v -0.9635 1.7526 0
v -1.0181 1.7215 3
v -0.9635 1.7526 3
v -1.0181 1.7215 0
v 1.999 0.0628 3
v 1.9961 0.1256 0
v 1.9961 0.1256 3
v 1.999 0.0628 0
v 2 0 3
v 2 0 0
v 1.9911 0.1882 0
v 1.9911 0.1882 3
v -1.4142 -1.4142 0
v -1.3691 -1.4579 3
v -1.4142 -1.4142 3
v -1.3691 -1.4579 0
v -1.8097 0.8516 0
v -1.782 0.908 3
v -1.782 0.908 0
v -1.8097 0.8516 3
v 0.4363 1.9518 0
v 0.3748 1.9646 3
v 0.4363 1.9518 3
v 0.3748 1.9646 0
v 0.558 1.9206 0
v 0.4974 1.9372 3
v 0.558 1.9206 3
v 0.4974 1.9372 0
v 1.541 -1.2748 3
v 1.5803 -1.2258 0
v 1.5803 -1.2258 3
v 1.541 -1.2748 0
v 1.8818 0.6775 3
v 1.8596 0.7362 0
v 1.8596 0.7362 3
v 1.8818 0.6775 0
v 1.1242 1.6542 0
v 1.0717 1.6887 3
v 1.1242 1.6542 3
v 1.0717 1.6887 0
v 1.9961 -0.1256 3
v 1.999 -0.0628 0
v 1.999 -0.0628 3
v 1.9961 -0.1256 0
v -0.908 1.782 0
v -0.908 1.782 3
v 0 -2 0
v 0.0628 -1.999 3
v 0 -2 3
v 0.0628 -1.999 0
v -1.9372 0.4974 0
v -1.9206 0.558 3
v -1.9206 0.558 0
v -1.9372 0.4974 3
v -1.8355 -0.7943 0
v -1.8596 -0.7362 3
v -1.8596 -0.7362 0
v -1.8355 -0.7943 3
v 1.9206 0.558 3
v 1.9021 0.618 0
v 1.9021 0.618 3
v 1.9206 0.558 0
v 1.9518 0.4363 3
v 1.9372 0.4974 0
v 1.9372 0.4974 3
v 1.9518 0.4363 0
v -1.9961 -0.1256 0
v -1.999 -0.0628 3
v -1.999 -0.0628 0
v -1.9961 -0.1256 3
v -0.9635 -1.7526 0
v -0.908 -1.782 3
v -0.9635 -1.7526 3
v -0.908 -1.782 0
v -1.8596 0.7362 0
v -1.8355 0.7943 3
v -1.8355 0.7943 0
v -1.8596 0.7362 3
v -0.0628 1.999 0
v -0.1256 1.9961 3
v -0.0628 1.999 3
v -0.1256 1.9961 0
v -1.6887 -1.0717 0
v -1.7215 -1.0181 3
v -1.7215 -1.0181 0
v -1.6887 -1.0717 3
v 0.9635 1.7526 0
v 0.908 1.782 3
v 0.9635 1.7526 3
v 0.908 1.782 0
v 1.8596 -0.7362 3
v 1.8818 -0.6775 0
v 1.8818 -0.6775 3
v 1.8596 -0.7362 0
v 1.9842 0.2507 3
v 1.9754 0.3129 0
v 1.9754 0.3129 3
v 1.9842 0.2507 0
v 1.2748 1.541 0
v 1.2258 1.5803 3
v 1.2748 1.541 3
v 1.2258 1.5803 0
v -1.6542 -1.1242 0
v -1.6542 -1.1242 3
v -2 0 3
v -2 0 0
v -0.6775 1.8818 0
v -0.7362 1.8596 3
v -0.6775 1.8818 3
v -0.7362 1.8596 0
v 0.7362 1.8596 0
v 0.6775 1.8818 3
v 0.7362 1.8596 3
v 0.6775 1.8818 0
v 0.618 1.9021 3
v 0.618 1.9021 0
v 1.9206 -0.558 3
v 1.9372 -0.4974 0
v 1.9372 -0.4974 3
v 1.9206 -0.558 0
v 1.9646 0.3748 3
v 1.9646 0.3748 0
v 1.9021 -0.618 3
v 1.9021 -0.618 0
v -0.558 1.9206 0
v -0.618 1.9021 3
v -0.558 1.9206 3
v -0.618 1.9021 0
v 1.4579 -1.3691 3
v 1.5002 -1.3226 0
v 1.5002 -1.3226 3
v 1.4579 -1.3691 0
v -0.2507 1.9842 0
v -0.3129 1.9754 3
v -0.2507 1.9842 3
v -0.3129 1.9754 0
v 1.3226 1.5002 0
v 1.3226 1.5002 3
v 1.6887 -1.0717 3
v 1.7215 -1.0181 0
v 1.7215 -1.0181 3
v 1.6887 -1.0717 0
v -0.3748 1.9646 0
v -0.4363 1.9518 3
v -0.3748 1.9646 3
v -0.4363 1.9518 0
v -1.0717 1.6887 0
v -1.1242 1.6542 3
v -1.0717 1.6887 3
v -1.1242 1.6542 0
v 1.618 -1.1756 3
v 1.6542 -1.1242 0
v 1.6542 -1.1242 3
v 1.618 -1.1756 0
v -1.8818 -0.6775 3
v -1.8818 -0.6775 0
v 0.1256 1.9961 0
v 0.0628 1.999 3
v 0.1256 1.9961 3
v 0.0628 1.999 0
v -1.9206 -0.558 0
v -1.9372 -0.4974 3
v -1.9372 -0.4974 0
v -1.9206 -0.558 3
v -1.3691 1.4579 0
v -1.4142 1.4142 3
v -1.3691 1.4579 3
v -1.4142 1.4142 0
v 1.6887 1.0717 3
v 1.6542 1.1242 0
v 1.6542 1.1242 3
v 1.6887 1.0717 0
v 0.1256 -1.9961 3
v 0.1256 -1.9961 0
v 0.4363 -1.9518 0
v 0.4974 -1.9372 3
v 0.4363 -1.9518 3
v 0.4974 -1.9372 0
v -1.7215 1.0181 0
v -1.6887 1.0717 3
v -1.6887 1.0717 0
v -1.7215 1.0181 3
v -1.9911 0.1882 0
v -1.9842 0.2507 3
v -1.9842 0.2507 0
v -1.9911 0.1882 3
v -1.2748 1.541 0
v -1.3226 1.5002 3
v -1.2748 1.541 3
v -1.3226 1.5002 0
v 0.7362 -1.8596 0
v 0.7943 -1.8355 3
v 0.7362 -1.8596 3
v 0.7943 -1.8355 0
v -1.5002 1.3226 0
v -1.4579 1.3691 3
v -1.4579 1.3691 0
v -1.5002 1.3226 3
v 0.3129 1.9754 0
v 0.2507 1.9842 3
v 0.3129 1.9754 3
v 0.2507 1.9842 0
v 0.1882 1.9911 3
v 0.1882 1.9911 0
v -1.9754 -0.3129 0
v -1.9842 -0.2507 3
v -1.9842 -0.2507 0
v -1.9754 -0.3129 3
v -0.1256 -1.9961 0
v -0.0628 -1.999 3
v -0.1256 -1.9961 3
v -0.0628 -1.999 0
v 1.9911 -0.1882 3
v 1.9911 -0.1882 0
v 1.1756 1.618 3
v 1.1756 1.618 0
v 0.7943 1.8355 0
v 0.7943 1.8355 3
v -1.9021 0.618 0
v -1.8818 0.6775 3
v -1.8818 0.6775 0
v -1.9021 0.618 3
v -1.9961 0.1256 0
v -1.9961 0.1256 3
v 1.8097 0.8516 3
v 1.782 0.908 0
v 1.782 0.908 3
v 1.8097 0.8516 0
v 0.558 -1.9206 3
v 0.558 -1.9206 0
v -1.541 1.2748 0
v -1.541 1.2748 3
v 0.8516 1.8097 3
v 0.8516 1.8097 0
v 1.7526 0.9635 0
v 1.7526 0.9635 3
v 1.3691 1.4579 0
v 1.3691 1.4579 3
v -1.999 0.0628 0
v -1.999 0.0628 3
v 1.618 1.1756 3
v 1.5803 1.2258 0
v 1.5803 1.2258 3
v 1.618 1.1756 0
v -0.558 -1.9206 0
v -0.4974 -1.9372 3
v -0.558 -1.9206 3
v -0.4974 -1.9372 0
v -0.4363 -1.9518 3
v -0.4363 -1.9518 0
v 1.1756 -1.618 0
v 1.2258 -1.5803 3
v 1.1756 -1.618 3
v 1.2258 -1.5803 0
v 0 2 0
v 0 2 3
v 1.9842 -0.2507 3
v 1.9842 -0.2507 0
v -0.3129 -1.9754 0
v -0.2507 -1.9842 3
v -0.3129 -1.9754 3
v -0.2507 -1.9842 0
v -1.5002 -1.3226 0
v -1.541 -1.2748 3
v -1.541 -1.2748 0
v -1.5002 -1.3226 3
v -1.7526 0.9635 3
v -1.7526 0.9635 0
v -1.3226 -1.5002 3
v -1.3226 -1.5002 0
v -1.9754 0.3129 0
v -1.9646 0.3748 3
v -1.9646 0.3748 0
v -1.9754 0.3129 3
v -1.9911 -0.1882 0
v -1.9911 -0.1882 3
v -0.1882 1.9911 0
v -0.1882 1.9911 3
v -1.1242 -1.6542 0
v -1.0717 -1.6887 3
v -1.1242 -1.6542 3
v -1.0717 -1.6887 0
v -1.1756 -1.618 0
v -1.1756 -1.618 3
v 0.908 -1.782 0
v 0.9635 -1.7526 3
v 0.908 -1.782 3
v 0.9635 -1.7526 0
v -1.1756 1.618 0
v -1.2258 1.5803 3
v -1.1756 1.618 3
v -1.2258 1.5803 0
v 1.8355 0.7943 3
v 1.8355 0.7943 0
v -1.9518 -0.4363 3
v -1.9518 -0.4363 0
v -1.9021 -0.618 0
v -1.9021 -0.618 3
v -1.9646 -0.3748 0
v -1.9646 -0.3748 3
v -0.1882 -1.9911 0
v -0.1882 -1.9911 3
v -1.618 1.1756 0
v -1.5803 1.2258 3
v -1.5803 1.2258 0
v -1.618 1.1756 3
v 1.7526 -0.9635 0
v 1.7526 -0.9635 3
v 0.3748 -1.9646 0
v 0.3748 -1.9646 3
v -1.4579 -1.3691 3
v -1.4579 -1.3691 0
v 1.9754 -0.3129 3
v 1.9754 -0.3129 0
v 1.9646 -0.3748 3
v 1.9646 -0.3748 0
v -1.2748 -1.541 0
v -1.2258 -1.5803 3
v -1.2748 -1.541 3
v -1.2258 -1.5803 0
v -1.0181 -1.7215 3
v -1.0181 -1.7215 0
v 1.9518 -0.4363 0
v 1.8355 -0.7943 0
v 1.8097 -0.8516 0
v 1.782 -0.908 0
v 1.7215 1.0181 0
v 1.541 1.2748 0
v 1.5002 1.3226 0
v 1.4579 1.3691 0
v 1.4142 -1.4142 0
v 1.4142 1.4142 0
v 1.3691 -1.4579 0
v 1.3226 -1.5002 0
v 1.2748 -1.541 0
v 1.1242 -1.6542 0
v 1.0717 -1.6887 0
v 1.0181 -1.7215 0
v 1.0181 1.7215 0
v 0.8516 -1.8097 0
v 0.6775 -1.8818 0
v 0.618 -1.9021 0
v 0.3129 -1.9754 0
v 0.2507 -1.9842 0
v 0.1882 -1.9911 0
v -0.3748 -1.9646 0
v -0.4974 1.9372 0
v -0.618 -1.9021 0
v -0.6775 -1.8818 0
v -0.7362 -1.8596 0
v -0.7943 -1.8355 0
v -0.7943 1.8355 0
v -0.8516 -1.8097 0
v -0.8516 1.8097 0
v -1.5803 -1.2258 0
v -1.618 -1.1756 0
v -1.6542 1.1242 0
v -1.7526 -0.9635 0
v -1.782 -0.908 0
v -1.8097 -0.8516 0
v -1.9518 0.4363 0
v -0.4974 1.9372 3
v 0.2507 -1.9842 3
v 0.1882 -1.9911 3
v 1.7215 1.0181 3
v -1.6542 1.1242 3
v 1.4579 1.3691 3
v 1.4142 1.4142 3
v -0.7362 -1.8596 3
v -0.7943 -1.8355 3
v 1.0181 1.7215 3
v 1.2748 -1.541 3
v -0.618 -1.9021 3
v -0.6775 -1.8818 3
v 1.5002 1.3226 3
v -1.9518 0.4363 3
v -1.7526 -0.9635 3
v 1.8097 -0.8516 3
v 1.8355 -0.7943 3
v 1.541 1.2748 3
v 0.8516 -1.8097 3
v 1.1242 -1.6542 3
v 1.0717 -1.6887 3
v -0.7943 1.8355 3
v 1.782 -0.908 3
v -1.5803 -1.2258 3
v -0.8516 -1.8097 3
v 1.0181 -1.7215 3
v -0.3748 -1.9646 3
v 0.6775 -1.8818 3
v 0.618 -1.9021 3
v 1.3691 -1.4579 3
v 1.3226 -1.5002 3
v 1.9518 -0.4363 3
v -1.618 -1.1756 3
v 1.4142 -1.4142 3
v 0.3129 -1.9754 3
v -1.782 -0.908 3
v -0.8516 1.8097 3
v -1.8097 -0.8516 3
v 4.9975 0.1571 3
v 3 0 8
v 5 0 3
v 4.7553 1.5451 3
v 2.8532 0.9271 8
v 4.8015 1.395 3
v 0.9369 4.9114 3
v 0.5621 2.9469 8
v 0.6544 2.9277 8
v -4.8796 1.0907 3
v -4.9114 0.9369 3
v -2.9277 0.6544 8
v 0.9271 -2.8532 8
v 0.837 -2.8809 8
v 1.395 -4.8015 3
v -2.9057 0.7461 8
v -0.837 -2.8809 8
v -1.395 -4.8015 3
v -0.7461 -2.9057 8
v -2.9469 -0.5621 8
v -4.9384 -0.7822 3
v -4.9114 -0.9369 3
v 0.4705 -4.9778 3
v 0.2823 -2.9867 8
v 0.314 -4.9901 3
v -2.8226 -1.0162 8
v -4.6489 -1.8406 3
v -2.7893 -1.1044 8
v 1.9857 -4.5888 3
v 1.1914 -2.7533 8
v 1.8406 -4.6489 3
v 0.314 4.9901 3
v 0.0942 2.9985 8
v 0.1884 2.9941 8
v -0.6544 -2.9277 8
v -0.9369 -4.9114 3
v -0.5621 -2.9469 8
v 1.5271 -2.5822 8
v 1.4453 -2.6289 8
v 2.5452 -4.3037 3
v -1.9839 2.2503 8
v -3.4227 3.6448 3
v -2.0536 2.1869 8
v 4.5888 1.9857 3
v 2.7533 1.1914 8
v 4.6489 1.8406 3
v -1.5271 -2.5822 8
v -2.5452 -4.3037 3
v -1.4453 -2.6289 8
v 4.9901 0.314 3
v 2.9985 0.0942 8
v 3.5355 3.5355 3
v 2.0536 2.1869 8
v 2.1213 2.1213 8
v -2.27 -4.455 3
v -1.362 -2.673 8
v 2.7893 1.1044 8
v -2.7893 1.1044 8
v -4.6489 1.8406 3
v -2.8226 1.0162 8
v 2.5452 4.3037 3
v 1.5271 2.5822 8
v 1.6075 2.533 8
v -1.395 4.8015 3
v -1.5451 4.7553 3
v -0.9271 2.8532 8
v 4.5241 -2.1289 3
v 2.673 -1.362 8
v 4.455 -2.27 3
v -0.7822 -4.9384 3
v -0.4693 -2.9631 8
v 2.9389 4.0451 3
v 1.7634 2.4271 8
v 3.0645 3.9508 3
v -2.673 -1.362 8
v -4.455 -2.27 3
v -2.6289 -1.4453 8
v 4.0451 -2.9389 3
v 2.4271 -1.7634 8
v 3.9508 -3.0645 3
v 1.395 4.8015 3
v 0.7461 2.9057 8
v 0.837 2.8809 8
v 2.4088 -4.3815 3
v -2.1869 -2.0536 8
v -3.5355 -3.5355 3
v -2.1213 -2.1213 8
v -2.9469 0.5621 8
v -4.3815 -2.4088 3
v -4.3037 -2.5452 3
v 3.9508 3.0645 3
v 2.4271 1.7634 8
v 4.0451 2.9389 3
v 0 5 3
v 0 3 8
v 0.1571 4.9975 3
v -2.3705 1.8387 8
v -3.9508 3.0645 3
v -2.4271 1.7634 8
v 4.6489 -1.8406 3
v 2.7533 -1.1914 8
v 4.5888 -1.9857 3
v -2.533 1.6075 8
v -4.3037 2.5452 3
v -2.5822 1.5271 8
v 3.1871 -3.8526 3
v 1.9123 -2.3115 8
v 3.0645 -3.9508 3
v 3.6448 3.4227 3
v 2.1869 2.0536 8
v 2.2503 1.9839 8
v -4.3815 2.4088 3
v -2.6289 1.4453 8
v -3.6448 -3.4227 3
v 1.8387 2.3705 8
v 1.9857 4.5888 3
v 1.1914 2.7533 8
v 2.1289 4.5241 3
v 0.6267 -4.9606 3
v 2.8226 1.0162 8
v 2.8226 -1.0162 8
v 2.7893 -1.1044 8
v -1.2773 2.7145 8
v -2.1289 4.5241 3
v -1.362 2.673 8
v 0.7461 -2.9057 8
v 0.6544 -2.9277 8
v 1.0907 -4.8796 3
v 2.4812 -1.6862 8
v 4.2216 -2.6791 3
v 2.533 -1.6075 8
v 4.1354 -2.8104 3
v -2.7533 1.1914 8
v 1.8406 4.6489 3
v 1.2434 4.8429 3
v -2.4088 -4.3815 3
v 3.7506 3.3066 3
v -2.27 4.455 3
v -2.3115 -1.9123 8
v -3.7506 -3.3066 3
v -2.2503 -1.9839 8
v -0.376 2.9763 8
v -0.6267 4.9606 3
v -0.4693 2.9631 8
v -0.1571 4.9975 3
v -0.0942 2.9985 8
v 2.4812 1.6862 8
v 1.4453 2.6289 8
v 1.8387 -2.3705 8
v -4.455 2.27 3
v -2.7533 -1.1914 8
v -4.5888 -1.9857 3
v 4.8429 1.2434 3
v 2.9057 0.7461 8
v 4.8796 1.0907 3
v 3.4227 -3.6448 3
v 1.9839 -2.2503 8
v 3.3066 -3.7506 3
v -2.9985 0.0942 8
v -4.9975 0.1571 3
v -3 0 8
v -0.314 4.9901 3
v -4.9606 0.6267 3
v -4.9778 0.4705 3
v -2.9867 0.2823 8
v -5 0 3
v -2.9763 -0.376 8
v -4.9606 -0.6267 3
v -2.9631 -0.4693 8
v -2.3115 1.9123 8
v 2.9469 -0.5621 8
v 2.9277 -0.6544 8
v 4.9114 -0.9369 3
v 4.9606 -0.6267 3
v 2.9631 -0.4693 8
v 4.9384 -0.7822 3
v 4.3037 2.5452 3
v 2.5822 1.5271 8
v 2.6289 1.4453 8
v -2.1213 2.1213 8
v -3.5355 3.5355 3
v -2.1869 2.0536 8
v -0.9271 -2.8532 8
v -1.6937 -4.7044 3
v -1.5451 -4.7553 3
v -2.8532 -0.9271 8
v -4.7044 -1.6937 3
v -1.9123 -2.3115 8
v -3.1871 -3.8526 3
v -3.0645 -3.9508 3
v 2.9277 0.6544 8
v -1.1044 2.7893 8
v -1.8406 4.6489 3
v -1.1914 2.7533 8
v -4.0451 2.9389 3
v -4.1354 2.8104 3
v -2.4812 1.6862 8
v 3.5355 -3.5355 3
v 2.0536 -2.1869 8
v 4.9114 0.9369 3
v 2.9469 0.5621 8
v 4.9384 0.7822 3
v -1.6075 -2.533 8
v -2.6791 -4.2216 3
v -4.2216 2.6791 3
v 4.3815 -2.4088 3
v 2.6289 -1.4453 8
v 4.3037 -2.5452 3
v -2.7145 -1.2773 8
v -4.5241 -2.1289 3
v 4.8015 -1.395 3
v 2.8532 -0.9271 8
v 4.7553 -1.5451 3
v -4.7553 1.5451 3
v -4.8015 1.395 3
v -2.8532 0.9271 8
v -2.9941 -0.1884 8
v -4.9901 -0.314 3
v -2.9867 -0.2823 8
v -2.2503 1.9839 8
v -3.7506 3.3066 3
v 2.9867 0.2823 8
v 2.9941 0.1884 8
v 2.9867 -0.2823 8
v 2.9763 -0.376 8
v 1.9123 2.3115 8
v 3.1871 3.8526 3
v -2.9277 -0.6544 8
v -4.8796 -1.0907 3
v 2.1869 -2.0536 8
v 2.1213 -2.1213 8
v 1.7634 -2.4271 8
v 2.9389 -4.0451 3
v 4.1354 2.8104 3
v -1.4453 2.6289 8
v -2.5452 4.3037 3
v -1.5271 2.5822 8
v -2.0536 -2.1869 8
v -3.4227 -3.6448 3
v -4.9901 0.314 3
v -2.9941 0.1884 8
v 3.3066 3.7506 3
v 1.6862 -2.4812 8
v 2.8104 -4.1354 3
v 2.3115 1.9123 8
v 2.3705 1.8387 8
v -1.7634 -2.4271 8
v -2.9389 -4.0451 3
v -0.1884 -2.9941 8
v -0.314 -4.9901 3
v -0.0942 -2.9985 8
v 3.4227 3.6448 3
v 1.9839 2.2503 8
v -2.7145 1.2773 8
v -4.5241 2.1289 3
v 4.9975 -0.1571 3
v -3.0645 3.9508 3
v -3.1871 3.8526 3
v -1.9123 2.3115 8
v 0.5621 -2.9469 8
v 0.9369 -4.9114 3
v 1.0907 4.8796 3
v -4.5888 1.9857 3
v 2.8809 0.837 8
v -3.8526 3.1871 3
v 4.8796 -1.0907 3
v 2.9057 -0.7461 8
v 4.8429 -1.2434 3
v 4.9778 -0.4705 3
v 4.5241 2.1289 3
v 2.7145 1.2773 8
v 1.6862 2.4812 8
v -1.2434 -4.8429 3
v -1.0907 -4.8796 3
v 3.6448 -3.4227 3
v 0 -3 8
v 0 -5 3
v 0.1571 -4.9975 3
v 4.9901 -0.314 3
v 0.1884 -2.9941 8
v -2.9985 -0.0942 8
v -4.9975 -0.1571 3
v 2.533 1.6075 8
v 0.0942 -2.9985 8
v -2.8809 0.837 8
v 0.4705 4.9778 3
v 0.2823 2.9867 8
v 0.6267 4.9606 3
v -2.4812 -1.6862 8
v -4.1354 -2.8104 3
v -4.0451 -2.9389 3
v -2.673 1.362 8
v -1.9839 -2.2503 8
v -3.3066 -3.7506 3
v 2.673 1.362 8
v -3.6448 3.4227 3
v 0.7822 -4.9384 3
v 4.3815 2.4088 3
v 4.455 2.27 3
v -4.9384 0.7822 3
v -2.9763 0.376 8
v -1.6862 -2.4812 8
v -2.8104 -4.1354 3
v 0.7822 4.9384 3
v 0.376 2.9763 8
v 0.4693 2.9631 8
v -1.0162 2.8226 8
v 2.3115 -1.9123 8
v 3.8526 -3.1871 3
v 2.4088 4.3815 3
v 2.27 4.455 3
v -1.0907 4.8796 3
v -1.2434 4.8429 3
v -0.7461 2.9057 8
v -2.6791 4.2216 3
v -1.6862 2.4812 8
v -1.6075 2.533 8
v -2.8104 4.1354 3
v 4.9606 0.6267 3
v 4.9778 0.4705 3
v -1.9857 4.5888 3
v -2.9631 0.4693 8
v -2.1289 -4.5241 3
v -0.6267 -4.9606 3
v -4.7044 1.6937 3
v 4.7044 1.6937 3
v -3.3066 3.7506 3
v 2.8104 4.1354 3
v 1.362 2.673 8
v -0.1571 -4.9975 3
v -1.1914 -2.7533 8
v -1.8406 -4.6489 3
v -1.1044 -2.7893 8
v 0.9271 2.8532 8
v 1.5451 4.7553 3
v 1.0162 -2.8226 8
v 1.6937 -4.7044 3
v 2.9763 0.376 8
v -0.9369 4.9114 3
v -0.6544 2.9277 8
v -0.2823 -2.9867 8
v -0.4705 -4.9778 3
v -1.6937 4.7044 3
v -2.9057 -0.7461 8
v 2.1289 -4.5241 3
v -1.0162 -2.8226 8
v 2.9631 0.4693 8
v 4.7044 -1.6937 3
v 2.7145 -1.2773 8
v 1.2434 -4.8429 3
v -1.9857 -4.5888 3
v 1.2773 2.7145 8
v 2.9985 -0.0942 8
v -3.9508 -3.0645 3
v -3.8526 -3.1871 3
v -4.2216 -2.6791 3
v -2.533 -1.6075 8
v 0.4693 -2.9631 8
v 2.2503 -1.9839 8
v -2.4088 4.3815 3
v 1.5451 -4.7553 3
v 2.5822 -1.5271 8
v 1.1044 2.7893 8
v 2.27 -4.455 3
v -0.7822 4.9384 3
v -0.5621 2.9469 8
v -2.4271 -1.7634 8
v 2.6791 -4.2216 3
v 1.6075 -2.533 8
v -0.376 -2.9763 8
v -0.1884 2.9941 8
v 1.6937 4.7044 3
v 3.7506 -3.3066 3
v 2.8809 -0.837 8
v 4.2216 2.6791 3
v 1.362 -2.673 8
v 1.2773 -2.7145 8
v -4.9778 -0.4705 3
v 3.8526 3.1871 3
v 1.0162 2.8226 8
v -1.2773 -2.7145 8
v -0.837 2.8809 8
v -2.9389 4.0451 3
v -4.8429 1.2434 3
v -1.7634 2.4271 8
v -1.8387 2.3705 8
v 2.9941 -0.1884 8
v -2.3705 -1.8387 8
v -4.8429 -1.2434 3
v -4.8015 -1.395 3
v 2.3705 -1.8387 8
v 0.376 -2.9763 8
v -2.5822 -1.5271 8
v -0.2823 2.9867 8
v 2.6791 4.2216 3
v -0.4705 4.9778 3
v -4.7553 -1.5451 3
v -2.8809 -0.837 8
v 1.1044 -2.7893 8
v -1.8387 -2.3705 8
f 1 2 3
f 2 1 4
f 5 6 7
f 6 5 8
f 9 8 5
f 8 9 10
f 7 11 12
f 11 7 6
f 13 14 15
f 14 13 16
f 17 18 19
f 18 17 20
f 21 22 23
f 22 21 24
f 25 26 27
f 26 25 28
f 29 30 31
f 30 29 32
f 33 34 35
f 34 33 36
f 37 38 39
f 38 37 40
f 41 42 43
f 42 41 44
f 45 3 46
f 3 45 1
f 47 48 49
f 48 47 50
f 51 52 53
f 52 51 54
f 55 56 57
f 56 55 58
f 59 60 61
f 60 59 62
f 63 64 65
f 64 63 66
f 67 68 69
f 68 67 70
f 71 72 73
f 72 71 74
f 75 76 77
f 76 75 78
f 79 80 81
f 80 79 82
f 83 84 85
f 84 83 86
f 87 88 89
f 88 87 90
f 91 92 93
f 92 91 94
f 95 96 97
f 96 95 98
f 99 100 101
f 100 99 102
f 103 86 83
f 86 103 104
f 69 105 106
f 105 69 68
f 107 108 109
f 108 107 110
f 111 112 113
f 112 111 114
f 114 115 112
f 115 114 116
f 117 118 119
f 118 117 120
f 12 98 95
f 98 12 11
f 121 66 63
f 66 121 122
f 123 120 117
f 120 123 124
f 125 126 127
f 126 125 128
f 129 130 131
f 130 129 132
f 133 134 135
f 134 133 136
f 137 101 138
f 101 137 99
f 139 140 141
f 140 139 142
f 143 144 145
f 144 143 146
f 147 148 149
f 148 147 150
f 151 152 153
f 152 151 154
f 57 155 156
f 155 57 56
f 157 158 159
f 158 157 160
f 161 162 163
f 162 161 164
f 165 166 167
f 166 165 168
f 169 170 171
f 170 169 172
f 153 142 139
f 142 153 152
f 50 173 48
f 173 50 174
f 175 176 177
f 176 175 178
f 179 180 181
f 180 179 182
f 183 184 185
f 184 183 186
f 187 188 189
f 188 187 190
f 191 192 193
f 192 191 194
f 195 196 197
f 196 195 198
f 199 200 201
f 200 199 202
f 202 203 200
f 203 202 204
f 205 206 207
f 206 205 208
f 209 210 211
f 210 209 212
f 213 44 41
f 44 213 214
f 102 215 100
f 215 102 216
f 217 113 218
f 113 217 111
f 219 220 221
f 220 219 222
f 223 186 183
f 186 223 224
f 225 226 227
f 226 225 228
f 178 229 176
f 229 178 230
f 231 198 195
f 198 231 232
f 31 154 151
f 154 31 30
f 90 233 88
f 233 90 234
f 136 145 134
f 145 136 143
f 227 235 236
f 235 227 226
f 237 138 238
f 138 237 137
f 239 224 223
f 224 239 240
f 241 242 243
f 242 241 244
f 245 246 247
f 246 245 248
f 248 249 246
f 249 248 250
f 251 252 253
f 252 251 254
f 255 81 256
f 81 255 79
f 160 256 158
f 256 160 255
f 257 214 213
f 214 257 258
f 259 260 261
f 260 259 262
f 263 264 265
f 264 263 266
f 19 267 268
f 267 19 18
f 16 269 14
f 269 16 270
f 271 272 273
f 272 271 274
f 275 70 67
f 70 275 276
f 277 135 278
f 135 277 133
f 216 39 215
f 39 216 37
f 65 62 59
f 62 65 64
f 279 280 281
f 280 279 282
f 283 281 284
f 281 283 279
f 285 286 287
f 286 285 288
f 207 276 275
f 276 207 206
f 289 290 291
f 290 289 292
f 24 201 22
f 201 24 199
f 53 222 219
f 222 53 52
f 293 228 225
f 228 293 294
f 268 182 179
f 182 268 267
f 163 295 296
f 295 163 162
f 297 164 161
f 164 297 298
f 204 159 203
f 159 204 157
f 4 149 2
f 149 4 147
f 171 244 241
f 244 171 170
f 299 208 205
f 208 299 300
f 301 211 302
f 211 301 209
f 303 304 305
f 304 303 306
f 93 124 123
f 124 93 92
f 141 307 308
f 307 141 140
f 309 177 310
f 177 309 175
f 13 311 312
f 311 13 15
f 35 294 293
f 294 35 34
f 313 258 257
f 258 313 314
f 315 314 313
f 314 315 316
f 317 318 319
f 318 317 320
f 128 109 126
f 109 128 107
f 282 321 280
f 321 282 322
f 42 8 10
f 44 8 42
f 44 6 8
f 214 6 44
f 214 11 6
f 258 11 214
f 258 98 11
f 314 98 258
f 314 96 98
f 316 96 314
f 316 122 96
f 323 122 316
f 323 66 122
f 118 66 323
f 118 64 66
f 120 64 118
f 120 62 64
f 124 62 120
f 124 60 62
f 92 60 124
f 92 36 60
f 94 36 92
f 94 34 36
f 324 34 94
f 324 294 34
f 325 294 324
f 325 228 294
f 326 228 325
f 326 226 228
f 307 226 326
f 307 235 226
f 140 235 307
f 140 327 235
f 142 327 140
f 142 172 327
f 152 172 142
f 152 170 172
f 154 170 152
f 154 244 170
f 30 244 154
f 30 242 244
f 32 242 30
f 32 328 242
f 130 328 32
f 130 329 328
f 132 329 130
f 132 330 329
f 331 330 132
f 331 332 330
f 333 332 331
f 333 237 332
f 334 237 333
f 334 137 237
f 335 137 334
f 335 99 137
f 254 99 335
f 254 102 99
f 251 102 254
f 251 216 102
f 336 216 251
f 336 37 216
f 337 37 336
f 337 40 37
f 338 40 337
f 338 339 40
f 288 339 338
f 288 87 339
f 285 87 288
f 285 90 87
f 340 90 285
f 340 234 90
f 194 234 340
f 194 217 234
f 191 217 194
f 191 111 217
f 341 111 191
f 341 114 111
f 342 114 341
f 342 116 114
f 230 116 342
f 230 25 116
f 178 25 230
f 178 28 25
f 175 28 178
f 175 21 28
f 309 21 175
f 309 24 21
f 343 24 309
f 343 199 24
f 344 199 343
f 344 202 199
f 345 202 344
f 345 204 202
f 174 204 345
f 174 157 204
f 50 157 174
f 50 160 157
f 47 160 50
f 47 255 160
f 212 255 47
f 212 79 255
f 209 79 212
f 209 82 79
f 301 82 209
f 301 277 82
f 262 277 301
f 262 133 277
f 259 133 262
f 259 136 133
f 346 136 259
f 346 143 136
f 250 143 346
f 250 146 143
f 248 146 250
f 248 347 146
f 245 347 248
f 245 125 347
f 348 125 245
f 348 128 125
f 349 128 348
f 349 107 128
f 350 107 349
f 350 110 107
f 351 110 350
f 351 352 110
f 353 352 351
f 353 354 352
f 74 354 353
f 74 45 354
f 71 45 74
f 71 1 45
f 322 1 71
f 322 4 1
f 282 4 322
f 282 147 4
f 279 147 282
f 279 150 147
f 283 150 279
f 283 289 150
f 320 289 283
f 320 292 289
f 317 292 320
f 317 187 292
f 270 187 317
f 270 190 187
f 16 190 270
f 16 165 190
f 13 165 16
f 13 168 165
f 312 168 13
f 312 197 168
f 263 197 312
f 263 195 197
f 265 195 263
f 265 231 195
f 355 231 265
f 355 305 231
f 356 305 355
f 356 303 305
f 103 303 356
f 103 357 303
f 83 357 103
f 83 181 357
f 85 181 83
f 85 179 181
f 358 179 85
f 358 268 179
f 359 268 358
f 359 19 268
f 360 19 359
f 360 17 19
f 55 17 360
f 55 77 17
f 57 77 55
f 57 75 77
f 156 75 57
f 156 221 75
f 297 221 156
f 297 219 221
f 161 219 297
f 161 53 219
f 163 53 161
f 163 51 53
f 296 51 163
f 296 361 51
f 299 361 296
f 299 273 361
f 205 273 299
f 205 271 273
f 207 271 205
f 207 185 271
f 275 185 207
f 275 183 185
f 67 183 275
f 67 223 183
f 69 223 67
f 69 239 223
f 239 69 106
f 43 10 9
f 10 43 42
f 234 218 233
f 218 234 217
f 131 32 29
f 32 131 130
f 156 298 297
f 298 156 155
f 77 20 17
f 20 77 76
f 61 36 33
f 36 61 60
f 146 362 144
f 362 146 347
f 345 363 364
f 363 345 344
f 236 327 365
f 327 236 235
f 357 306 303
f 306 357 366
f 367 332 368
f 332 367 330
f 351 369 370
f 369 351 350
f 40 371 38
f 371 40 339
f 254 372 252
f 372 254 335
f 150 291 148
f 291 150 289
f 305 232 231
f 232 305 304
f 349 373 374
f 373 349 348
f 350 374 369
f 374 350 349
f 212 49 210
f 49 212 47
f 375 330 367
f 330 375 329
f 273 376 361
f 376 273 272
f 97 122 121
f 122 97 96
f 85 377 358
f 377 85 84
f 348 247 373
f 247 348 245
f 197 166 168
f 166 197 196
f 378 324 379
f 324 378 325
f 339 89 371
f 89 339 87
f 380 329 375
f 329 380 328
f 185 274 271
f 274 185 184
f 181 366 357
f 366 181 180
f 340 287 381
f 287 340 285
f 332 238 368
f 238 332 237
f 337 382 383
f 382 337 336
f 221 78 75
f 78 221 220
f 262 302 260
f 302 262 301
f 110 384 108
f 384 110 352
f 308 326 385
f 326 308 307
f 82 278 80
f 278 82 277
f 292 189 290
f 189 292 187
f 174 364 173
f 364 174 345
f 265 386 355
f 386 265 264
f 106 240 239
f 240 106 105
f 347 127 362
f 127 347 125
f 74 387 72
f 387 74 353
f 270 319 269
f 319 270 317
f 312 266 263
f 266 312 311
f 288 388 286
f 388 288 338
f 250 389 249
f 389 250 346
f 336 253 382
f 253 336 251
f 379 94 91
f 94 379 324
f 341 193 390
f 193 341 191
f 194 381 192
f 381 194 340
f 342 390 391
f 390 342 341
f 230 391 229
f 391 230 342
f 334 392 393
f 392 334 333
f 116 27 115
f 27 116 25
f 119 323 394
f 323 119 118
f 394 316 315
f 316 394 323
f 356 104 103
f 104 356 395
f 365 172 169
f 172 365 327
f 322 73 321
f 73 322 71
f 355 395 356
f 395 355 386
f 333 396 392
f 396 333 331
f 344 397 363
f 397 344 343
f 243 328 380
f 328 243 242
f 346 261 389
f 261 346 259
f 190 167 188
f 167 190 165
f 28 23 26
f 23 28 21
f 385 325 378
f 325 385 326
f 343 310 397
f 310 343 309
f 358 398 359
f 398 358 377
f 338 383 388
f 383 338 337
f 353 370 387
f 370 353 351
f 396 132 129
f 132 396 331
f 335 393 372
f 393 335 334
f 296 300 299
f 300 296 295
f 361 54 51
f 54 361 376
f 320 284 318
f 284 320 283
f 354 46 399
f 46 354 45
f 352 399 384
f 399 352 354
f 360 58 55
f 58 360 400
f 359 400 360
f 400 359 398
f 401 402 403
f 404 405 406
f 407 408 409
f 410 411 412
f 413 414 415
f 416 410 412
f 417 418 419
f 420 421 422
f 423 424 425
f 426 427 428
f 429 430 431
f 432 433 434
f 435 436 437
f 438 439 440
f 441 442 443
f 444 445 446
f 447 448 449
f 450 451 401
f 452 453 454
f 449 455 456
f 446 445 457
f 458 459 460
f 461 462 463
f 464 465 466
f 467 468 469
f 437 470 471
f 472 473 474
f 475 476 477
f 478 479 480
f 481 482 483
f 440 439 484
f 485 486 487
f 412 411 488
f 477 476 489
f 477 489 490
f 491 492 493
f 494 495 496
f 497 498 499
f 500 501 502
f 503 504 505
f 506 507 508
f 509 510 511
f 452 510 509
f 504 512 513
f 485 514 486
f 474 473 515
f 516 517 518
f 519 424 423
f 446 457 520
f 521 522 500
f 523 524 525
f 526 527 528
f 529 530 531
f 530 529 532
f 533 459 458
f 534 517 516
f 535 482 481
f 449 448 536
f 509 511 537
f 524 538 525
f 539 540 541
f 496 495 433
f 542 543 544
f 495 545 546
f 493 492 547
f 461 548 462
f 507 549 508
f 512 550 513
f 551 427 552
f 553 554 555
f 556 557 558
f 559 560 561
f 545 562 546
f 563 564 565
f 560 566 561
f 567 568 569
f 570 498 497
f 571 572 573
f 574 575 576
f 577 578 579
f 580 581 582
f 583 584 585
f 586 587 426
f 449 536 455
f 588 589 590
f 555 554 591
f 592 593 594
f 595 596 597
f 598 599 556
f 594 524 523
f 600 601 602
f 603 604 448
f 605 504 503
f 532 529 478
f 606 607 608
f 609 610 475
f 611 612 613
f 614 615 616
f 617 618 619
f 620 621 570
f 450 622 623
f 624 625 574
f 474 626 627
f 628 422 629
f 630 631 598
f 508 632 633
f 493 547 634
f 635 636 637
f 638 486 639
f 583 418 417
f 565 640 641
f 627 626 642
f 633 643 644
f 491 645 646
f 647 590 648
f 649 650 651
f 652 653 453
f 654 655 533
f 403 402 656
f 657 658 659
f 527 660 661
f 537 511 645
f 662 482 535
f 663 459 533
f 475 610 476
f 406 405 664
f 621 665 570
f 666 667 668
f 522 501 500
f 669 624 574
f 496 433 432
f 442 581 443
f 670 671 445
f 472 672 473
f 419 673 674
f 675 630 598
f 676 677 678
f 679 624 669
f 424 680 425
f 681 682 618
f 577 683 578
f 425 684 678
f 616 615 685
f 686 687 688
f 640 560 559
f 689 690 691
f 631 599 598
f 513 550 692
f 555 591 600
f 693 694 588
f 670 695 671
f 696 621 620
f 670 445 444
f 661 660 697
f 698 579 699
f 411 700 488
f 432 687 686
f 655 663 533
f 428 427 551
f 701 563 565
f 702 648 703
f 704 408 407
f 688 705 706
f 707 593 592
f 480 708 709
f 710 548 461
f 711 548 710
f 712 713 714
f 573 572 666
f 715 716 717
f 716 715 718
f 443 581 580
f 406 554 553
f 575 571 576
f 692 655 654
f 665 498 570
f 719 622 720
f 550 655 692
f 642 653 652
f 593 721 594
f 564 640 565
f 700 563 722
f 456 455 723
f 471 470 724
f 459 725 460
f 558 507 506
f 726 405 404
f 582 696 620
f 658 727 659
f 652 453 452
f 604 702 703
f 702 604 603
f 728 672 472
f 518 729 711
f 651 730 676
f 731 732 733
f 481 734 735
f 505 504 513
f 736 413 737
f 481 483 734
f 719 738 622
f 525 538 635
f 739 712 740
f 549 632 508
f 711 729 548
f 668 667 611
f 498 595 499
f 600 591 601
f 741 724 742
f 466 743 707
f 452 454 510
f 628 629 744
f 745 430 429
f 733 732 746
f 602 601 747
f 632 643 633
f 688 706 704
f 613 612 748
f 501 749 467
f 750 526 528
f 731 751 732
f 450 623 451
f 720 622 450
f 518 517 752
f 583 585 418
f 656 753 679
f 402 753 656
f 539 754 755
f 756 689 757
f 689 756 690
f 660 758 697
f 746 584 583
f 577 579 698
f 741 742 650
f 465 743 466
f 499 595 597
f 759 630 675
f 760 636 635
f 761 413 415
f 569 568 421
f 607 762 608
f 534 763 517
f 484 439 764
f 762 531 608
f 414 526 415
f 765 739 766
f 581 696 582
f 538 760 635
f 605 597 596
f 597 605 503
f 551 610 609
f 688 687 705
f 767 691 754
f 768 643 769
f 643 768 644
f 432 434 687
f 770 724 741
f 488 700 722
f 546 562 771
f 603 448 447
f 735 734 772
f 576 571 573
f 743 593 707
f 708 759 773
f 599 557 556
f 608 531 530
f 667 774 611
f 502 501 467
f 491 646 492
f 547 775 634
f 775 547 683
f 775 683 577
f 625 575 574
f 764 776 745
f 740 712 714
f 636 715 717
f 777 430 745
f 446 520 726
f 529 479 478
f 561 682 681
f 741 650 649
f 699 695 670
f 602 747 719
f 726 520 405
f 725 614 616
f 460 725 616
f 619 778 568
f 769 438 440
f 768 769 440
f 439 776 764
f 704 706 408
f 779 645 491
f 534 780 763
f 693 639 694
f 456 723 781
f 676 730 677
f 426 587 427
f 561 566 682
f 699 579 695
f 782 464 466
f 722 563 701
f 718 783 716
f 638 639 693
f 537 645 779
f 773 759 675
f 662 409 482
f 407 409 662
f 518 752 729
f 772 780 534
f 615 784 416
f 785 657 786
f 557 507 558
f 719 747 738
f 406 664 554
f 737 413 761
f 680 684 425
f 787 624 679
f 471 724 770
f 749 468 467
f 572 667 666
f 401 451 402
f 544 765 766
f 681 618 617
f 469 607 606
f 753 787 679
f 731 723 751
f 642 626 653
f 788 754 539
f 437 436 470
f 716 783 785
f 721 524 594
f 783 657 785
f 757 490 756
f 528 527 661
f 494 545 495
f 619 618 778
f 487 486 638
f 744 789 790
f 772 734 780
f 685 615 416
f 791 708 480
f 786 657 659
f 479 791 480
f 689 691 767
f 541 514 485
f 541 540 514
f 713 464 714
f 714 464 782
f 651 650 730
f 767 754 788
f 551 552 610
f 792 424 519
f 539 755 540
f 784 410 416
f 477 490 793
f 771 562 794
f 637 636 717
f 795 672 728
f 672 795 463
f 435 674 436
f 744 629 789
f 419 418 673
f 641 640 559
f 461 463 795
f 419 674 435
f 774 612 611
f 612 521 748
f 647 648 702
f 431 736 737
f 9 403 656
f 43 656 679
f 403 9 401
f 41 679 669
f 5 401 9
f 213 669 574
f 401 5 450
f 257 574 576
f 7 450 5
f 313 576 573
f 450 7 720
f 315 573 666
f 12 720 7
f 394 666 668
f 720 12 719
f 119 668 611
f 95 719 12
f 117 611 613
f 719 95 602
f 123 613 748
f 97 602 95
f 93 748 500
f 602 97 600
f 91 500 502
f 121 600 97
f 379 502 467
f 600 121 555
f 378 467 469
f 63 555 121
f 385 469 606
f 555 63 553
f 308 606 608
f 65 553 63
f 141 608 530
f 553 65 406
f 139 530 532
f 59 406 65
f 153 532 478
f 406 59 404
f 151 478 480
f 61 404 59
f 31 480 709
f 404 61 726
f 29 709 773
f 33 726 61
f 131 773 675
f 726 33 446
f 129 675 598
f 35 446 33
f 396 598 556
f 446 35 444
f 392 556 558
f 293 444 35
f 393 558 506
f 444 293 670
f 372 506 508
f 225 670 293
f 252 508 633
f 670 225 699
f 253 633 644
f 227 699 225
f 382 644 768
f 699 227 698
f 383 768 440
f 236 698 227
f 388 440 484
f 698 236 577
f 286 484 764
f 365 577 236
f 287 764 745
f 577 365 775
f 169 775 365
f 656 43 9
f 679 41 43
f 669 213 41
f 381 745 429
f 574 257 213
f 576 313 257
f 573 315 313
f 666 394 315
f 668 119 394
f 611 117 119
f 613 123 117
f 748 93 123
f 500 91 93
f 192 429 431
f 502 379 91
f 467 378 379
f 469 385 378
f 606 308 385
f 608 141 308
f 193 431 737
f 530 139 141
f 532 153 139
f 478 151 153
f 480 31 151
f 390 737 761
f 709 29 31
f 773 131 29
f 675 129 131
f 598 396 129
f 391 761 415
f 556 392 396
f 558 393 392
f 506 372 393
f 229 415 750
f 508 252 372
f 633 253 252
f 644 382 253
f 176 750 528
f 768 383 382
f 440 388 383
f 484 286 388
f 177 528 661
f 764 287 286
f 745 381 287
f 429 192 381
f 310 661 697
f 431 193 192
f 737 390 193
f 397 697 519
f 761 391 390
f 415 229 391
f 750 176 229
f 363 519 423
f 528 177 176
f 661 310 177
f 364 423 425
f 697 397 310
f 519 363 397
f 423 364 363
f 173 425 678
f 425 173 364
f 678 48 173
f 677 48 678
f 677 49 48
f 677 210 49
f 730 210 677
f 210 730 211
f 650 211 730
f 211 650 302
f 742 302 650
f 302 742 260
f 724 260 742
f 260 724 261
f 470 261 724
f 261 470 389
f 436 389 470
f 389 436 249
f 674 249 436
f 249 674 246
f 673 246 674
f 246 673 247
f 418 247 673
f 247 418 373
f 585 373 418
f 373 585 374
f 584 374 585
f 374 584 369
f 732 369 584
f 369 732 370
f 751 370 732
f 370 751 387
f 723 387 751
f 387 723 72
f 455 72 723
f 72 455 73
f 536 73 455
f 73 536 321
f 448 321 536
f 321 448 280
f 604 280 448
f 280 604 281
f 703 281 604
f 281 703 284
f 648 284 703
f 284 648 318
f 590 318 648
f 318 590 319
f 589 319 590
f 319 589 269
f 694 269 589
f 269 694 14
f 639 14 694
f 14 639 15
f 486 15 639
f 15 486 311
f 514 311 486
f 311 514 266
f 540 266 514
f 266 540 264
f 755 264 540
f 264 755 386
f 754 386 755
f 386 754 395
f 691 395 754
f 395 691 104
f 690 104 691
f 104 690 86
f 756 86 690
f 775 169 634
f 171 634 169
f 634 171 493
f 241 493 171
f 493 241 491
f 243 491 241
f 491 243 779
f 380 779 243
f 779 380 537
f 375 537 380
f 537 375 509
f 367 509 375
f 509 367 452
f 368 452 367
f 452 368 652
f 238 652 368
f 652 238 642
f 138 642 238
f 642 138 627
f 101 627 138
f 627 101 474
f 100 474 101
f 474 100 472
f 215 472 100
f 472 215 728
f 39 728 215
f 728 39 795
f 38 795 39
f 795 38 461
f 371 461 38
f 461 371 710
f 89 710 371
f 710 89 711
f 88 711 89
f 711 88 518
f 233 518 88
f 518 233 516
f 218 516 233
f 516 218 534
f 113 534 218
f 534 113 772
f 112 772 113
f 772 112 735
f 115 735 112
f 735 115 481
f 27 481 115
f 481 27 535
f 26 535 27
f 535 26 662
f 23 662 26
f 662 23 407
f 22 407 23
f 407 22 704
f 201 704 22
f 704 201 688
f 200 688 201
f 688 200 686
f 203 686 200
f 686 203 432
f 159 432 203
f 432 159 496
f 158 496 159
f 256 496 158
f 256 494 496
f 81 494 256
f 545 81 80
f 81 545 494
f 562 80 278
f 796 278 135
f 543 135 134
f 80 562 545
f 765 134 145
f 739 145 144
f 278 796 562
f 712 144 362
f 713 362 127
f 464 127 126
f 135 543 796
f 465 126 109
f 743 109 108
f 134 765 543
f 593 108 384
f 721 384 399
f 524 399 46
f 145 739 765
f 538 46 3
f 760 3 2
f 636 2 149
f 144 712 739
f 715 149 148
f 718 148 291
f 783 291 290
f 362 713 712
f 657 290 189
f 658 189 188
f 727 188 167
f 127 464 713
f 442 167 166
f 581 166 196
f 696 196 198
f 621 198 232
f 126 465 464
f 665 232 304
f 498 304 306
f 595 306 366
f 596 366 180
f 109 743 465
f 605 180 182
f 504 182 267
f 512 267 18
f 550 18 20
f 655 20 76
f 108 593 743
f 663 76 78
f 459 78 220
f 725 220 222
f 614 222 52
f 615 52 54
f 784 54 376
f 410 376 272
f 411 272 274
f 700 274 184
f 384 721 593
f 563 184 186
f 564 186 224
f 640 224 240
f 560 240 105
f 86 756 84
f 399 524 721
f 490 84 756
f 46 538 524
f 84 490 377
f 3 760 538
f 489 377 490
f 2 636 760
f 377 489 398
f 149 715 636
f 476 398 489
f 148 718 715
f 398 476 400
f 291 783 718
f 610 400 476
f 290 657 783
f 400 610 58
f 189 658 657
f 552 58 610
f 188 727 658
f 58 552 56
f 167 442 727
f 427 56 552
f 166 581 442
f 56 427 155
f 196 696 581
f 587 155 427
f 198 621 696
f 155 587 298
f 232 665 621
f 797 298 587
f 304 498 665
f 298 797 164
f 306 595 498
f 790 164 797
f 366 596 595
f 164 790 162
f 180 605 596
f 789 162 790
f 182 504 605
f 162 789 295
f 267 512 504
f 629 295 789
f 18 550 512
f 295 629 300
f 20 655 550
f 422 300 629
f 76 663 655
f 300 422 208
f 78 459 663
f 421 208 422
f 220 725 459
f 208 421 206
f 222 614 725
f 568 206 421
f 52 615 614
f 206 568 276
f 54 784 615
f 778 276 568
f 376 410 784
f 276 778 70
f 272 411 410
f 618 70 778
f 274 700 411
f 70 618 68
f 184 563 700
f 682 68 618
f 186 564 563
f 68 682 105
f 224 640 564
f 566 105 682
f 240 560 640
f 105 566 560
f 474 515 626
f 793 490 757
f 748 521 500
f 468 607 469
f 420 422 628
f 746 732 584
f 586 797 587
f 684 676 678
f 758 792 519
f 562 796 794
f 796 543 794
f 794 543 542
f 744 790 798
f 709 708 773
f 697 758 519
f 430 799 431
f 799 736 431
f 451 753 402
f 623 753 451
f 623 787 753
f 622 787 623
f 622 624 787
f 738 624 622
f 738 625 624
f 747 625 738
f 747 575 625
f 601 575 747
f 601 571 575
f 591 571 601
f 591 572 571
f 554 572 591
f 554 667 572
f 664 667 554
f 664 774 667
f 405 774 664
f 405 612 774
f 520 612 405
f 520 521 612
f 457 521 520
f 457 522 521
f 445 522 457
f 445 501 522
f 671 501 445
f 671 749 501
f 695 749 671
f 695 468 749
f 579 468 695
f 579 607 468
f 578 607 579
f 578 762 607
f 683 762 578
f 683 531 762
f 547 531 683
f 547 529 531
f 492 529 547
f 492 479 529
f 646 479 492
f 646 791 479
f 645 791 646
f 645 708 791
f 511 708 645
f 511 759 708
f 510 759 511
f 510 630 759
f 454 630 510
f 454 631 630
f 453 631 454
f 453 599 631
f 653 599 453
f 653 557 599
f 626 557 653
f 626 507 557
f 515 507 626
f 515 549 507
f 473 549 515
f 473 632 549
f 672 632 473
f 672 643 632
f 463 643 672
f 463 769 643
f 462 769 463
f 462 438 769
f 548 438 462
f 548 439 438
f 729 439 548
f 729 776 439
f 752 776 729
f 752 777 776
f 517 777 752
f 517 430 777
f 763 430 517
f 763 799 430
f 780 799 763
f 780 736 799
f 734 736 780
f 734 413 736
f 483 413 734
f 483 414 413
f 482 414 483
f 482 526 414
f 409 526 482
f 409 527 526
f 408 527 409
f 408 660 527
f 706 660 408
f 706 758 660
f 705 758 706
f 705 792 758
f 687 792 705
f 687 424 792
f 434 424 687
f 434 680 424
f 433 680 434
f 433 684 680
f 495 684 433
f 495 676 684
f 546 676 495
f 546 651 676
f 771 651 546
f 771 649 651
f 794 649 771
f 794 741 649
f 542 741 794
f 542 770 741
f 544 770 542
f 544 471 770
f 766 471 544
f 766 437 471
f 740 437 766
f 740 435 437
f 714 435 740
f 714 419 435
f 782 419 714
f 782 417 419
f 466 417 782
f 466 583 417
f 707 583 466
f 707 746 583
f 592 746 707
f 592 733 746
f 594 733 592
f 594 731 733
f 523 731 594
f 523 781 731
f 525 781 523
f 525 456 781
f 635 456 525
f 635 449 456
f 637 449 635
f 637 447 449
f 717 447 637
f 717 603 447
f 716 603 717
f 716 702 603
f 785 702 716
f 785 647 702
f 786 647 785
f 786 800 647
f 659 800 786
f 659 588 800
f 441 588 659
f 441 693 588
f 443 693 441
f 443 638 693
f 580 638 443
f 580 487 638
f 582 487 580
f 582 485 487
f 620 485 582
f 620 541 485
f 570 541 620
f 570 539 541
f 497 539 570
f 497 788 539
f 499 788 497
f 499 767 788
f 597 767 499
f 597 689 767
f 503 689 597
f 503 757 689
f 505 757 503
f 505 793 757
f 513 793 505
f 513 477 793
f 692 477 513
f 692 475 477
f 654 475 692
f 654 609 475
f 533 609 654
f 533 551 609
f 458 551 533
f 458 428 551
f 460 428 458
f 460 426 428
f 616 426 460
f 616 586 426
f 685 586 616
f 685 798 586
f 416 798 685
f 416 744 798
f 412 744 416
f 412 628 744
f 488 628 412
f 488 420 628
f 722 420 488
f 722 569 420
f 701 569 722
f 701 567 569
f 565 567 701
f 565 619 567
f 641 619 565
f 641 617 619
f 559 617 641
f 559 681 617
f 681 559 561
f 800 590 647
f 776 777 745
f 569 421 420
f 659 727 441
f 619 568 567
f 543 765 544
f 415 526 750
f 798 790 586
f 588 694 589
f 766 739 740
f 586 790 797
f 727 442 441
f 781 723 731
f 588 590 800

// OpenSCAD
$fn=200;

SensorCase=0;
SensorLid=0;

ConsoleCase=0;
ConsoleInsert=0;
ConsoleInsertPlate=0;
ConsoleLid=0;

Foot=1;

// Specials 
SensorboxHolder=0; // Holder for above monitor

W=120;
D=150;

ROZE="#FB48C4";

if(Foot) {
 cylinder(d=4,h=6);
 translate([0,0,3])cylinder(d2=6,d1=10,h=5);
}

if(SensorboxHolder) { // For above a monitor
 difference() {
  translate([15,21,-1])cube([50,31,30]);
  translate([30,21+15.5,24]) cylinder(d=3.4,h=10);
  translate([50,21+15.5,24]) cylinder(d=3.4,h=10);
 }
 translate([15,20,-21]) rotate([-4,0,0]) difference() {
  cube([50,30,24]);
  translate([-1,4.5,-4])cube([60,21,24]);
 }
 translate([16,52,30]) DoSensorCase();
}

if(ConsoleCase) translate([0,110,0]) {
 difference() {
  union() {
   color(ROZE)Cube(W,D,40,5); 
   // Draw a line to show where the color change should be
   // 1.4mm high
   translate([0,0,16])color("white")Cube(W,D,1.4,5); 
  }
  translate([2,2,2]) Cube(W-4,D-4,50,5);  
  translate([30,-10,6])cube([W-60,20,30]);
  // LED
  translate([W-11,10,8.6]) rotate([90,0,0]) cylinder(d=5,h=40);
  translate([W-11,-3.4,8.6]) rotate([90,0,0]) sphere(d=10);
  // Cooling ribs
  for(i=[1:1:D/10]) {
   translate([W-4,11+8*i,2])cube([10,2,12]);
   if(i>7) translate([-2,11+8*i,2])cube([10,2,12]);
  }
  // Leonardo
  translate([0,20,3]) {      
   // USB
   translate([-10,41.2-3,2])cube([50,9,5]);
   // Power
   translate([-10,9.2-4,2.4])cube([50,11,13.2]);
   
   // Mounting holes Leonardo 5.2 14
   translate([-12+14,1.4+1.5-5.2,-0.2]) {
     translate([14,8.8,-10])cylinder(d=2.6,h=101);
     translate([66.1,13.9,-10])cylinder(d=2.6,h=101);
     translate([66.1,41.8,-10])cylinder(d=2.6,h=101);

     translate([15.3,57,-10])cylinder(d=2.6,h=101);  
     
     translate([14,8.8,-10])cylinder(d=5,h=8);
     translate([66.1,13.9,-10])cylinder(d=5,h=8);
     translate([66.1,41.8,-10])cylinder(d=5,h=8);
     translate([15.3,57,-10])cylinder(d=5,h=8);
    }    
  }
  // Connectors for Top, Right and Left sensor
  translate([25,D+4,11]) rotate([90,0,0]) DINPlug();
  translate([W-25,D+4,11]) rotate([90,0,0]) DINPlug();
  translate([W/2,D+4,28]) rotate([90,0,0]) DINPlug();
  
  translate([25,D+9,11]) rotate([90,0,0]) DINPlug(true);
  translate([W-25,D+9,11]) rotate([90,0,0]) DINPlug(true);
  translate([W/2,D+9,28]) rotate([90,0,0]) DINPlug(true);
  
  // Holes for feet
  translate([14,14,-1]) cylinder(d=4,h=10);
  translate([W-14,14,-1]) cylinder(d=4,h=10);
  translate([W-14,D-14,-1]) cylinder(d=4,h=10);
  translate([14,D-14,-1]) cylinder(d=4,h=10);
 }//diff
 
 // PCB holder for I2C multiplexer
 translate([20,100,0])difference() {
  cylinder(d1=16,d2=9,h=32);
  translate([0,0,32-4])cylinder(d=3.4,h=10);
 }
 translate([25.5,0,0]) translate([20,100,0])difference() {
  cylinder(d1=16,d2=9,h=32);
  translate([0,0,32-4])cylinder(d=3.4,h=10);
 }
 
 
 
 color(ROZE){
  translate([6,6,0]) difference(){cylinder(d=10,h=40);translate([0,0,35.8])cylinder(d=3.4,h=10);}
  translate([W-6,6,20]) difference(){cylinder(d=10,h=20);translate([0,0,15.8])cylinder(d=3.4,h=10);}
  translate([W-6,D-6,0]) difference(){cylinder(d=10,h=40);translate([0,0,35.8])cylinder(d=3.4,h=10);}
  translate([6,D-6,0]) difference(){cylinder(d=10,h=40);translate([0,0,35.8])cylinder(d=3.4,h=10);}
 
 }
}

if(ConsoleInsertPlate) {
 rotate([90,0,0])hull() {
  rotate([90,0,0])cylinder(d=10,h=1.2);
  translate([40,0,0])rotate([90,0,0])cylinder(d=10,h=1.2);
 }
 
 translate([40/2,0,0])
 rotate([-90,0,0])
 color("white")  rotate([90,0,0]) linear_extrude(height=1)
  text(size=6.4,halign="center",valign="center",font="SF Atarian System Extended:style=Bold",
  text="Photon Fit");
}

if(ConsoleInsert) translate([0,110,2]){
 color("grey") difference() {
  translate([10,2,0])cube([W-20.4,10,37.8]);
  translate([30,-4,6])Cube(60,11,30,5);
  translate([W/2,51.2,8])rotate([90,0,0]) VLXSensor();
  
  translate([6,6,0]) cylinder(d=10,h=40);
  translate([W-6.4,6,-1]) cylinder(d=10,h=40);
  
  // LED
  translate([W-11,20,8.6]) rotate([90,0,0]) cylinder(d=15,h=40);
  
  // Name plate
  translate([W/2-40/2,8,26.4])hull() {
   rotate([90,0,0])cylinder(d=10,h=2);
   translate([40,0,0])rotate([90,0,0])cylinder(d=10,h=2);
  }
 }
 
 // Supports (for VLXSensor) - remove after printing
 translate([W/2,51.0,8])rotate([90,0,0]) {
  translate([-10,5,39])difference(){cylinder(d=4.4,h=4);translate([0,0,-1]) cylinder(d=2.6,h=10);}
  translate([10,5,39])difference(){cylinder(d=4.4,h=4);translate([0,0,-1]) cylinder(d=2.6,h=10);}
  
  translate([-3.5,1.5,39]) difference() {
   translate([-0.6,-0.6,0]) cube([8.2,5.2,5]);
   cube([7,4,10]);
  }
 }
}

if(ConsoleLid) translate([0,110,50]) {
 difference() {
  union() {
   color(ROZE)Cube(W,D,2,5);
   translate([W/2,D/2,2])color("white")cylinder(d1=50,d2=40,h=5);
  }
  // Button
  translate([W/2,D/2,-2])cylinder(d=30,h=20);
  
  translate([6,6,-1]) cylinder(d=2.6,h=40);
  translate([W-6,6,-1]) cylinder(d=2.6,h=40);
  translate([W-6,D-6,-1]) cylinder(d=2.6,h=40);
  translate([6,D-6,-1]) cylinder(d=2.6,h=40);
  
  translate([6,6,1]) cylinder(d=5,h=40);
  translate([W-6,6,1]) cylinder(d=5,h=40);
  translate([W-6,D-6,1]) cylinder(d=5,h=40);
  translate([6,D-6,1]) cylinder(d=5,h=40);  
 }
}

if(SensorLid)translate([0,-56,0]) {
 difference() {
   translate([2,-2,2]) hull() {
    translate([0,0,0]) rotate([90,0,0])cylinder(d=6,h=1);
    translate([46,0,0]) rotate([90,0,0]) cylinder(d=6,h=1);
    translate([46,0,46]) rotate([90,0,0]) cylinder(d=6,h=1);
    translate([0,0,46]) rotate([90,0,0])cylinder(d=6,h=1);  
  }
  translate([2,0,2]) rotate([90,0,0]) translate([1,1,-2])cylinder(d=2.6,h=10);
  translate([46,0,2]) rotate([90,0,0]) translate([1,1,-2])cylinder(d=2.6,h=10);
  translate([46,0,46]) rotate([90,0,0]) translate([1,1,-2])cylinder(d=2.6,h=10);
  translate([2,0,46]) rotate([90,0,0]) translate([1,1,-2])cylinder(d=2.6,h=10);
  translate([2,0.6,2]) rotate([90,0,0]) translate([1,1,3.2])cylinder(d=5,h=10);
  translate([46,0.6,2]) rotate([90,0,0]) translate([1,1,3.2])cylinder(d=5,h=10);
  translate([46,0.6,46]) rotate([90,0,0]) translate([1,1,3.2])cylinder(d=5,h=10);
  translate([2,0.6,46]) rotate([90,0,0]) translate([1,1,3.2])cylinder(d=5,h=10);
  
  translate([25,43,10])rotate([90,0,0]) VLXSensor();
  
  translate([15,-3.6,15])rotate([90,0,0])cylinder(d=4.6,h=10);
  translate([35,-3.6,15])rotate([90,0,0])cylinder(d=4.6,h=10);
  
 }//diff
 
 translate([25,-2,13.5])rotate([90,0,0]) difference() {
   cylinder(d=12,h=3);
   translate([0,0,-1])cylinder(d=10,h=10);
  }
 
 translate([25,-3,34])
 rotate([90,0,0])
 #linear_extrude(height=1) text(size=5,halign="center",valign="center",font="SF Atarian System Extended:style=Bold",
  text="Photon Fit");
}

module VLXSensor() {
 translate([-10,5,30])cylinder(d=2.6,h=20); 
 translate([-10+20,5,30])cylinder(d=2.6,h=20); 
 translate([-3.5,1.5,32]) cube([7,4,16]);
 translate([-15,-2,33.2]) cube([30,15,10]);   
}

if(SensorCase) {
 DoSensorCase();
}

module DoSensorCase() {
 // Print this with a seconde coloured line
 difference() {
  union() {
   hull() {
    rotate([90,0,0])cylinder(d=6,h=50);
    translate([50,0,0]) rotate([90,0,0]) cylinder(d=6,h=50);
    translate([50,0,50]) rotate([90,0,0]) cylinder(d=6,h=50);
    translate([0,0,50]) rotate([90,0,0])cylinder(d=6,h=50);
   }
   translate([2,0,2]) rotate([90,0,0])cylinder(d=12,h=50);
   translate([48,0,2]) rotate([90,0,0]) cylinder(d=12,h=50);
   translate([48,0,48]) rotate([90,0,0]) cylinder(d=12,h=50);
   translate([2,0,48]) rotate([90,0,0]) cylinder(d=12,h=50);
  }
  translate([2,-2,2]) hull() {
   translate([0,0,0]) rotate([90,0,0])cylinder(d=6,h=50);
   translate([46,0,0]) rotate([90,0,0]) cylinder(d=6,h=50);
   translate([46,0,46]) rotate([90,0,0]) cylinder(d=6,h=50);
   translate([0,0,46]) rotate([90,0,0])cylinder(d=6,h=50);
  }
  // DIN panel mount
  translate([25,1,12]) rotate([90,0,0]) DINPlug();
  //translate([25,9.4,12]) rotate([90,0,0]) DINPlug(true);
  // Heat pipes
  for(i=[0:1:2]) {
   translate([0,-5*i,0]) hull() {
    translate([15,-10,52])sphere(d=3.2);
    translate([35,-10,52])sphere(d=3.2);
   } 
  }//for

 }//diff
 // Cyl's to mount lid
 translate([2,0,2]) rotate([90,0,0])difference(){cylinder(d=12,h=42); translate([1,1,38])cylinder(d=3.2,h=10);}
 translate([48,0,2]) rotate([90,0,0]) difference(){cylinder(d=12,h=42); translate([-1,1,38])cylinder(d=3.2,h=10);}
 translate([48,0,48]) rotate([90,0,0]) difference(){cylinder(d=12,h=42); translate([-1,-1,38])cylinder(d=3.2,h=10);}
 translate([2,0,48]) rotate([90,0,0]) difference(){cylinder(d=12,h=42); translate([1,-1,38])cylinder(d=3.2,h=10);}
}

module DINPlug(Surrounding=false) {
 if(Surrounding) {
  hull() {
   cylinder(d=20.2,h=10);
   translate([11.1,0,0]) cylinder(d=7,h=10);
   translate([-11.1,0,0]) cylinder(d=7,h=10);
  }
 }
 else {
  cylinder(d=15.4,h=10);
  translate([11.1,0,0]) cylinder(d=3.1,h=10);
  translate([-11.1,0,0]) cylinder(d=3.1,h=10);
 }
}

module Cube(xdim ,ydim ,zdim,rdim=1) {
 hull(){
  translate([rdim,rdim,0])cylinder(h=zdim,r=rdim);
  translate([xdim-rdim,rdim,0])cylinder(h=zdim,r=rdim);
  translate([rdim,ydim-rdim,0])cylinder(h=zdim,r=rdim);
  translate([xdim-rdim,ydim-rdim,0])cylinder(h=zdim,r=rdim);
 }
}
